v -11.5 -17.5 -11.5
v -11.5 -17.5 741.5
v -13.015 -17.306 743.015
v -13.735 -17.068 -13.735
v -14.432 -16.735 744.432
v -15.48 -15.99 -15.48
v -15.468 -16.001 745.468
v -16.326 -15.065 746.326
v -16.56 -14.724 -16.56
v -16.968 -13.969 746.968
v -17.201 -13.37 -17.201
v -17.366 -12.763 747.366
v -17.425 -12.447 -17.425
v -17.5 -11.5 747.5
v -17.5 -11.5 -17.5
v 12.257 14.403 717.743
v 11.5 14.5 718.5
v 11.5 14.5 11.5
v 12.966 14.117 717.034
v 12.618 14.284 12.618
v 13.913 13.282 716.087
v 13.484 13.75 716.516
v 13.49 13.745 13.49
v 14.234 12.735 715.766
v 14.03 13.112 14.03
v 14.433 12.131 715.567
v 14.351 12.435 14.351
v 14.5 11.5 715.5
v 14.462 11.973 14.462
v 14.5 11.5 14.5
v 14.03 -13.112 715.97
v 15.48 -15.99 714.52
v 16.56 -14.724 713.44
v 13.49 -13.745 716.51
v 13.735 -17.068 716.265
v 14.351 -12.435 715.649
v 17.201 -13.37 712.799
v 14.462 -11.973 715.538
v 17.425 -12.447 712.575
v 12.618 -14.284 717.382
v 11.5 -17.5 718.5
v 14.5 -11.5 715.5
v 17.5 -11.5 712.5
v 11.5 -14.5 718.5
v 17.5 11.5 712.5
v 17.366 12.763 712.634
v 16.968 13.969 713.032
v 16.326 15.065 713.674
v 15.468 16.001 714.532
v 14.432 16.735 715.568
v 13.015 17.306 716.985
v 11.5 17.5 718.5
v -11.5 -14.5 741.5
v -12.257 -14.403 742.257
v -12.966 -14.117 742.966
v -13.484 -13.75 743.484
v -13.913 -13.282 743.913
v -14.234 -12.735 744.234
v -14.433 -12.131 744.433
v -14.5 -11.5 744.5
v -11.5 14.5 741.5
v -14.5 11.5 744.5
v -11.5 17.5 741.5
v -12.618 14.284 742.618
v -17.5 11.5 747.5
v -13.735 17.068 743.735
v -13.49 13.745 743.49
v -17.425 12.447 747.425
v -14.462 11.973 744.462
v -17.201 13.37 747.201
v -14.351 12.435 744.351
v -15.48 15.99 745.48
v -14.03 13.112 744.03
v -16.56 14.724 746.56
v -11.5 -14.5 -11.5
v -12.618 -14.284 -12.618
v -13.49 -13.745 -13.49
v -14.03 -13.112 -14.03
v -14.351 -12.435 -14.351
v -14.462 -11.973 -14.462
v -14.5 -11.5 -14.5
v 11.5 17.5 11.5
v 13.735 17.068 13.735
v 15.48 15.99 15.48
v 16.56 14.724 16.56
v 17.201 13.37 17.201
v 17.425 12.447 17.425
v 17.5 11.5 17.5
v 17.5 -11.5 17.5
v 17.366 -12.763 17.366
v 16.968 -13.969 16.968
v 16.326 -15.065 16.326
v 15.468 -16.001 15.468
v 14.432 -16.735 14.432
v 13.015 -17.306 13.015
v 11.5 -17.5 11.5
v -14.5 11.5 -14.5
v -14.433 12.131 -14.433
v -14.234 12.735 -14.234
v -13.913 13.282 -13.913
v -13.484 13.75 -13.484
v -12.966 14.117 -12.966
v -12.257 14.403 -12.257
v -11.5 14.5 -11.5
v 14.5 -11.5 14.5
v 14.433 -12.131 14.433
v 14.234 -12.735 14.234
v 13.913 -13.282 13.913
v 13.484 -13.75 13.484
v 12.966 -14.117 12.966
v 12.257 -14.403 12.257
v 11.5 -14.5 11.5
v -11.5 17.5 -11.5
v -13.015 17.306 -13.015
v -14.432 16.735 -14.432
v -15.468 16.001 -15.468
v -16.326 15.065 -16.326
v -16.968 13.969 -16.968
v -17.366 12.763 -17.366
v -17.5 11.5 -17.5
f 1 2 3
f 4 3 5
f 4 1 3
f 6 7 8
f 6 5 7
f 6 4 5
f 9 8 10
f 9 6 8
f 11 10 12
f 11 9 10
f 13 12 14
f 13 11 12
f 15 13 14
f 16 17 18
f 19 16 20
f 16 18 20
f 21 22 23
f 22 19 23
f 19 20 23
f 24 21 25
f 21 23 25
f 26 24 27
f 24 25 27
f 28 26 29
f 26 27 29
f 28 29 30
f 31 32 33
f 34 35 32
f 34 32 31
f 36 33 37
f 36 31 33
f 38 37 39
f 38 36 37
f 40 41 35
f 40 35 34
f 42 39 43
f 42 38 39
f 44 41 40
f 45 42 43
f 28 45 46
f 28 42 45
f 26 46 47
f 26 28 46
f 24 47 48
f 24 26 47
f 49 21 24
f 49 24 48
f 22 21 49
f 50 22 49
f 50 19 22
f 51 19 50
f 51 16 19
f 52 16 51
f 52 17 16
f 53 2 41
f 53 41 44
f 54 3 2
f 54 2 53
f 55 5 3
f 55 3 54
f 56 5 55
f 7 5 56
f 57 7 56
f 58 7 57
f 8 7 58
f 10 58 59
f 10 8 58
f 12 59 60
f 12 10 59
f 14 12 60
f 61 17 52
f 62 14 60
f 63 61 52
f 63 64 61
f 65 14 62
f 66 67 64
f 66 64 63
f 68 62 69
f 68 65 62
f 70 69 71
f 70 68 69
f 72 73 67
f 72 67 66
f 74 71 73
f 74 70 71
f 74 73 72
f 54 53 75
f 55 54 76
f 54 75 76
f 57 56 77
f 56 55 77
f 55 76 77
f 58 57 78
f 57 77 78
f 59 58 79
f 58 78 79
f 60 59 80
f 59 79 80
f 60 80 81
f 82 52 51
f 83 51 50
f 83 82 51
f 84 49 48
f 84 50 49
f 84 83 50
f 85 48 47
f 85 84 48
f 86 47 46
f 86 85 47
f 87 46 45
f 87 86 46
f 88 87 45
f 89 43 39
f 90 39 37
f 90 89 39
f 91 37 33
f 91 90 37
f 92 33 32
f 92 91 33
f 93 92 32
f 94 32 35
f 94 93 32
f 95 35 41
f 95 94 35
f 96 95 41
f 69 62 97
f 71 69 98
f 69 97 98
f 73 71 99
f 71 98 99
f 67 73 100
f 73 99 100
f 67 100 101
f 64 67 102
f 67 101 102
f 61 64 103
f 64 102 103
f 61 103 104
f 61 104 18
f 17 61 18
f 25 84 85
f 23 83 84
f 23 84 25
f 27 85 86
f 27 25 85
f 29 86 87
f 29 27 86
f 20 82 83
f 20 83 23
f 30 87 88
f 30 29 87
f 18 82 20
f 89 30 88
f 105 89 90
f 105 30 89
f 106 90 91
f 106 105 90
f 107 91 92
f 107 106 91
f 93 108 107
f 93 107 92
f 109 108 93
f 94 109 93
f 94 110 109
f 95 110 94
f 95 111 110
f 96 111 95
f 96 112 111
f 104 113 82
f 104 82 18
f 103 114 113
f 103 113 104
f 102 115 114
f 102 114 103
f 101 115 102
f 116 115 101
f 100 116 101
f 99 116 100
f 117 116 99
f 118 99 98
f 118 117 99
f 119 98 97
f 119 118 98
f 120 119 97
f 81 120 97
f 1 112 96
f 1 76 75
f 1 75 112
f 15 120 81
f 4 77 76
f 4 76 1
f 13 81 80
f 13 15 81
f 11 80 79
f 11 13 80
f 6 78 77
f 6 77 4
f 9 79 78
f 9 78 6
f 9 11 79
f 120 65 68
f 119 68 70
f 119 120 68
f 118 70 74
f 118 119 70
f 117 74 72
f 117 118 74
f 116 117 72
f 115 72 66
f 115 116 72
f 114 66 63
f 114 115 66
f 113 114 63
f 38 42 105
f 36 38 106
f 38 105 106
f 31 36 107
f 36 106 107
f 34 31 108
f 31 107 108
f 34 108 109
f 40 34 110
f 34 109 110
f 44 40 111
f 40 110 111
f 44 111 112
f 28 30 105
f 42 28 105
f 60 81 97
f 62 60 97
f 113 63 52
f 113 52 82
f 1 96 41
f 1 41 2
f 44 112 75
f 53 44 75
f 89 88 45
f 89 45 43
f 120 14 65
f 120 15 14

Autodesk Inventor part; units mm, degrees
ref_plane "Start plane" through (0, 0, -17.5) normal (0, 0, 1) x (1, 0, 0)
ref_plane "End plane" through (0, 0, 747.5) normal (0, 0, 1) x (1, 0, 0)
sketch "Sketch" plane through (0, 0, 0) normal (0, 0, 1) x (1, 0, 0)
  line L0 (-17.5, -11.5) -> (-17.5, 11.5)
  line L1 (-11.5, 17.5) -> (11.5, 17.5)
  line L2 (17.5, 11.5) -> (17.5, -11.5)
  line L3 (11.5, -17.5) -> (-11.5, -17.5)
  arc A0 (-17.5, -11.5) -> (-11.5, -17.5) centre (-11.5, -11.5) ccw
  arc A1 (-11.5, 17.5) -> (-17.5, 11.5) centre (-11.5, 11.5) ccw
  arc A2 (17.5, 11.5) -> (11.5, 17.5) centre (11.5, 11.5) ccw
  arc A3 (11.5, -17.5) -> (17.5, -11.5) centre (11.5, -11.5) ccw
  arc A4 (-11.5, 14.5) -> (-14.5, 11.5) centre (-11.5, 11.5) ccw
  line L4 (-11.5, 14.5) -> (11.5, 14.5)
  arc A5 (14.5, 11.5) -> (11.5, 14.5) centre (11.5, 11.5) ccw
  line L5 (14.5, 11.5) -> (14.5, -11.5)
  arc A6 (11.5, -14.5) -> (14.5, -11.5) centre (11.5, -11.5) ccw
  line L6 (11.5, -14.5) -> (-11.5, -14.5)
  arc A7 (-14.5, -11.5) -> (-11.5, -14.5) centre (-11.5, -11.5) ccw
  line L7 (-14.5, -11.5) -> (-14.5, 11.5)
  line L8 (0, 25.4278) -> (0, -25.4278) construction
  line L9 (-25.4278, 0) -> (25.4278, 0) construction
  dimension "d7" = 6
  dimension "d10" = 35
  dimension "d11" = 35
  dimension "d12" = 3
  dimension "d15" = 17.5
  dimension "d16" = 17.5
extrude "Body" add sketch "Sketch" along normal up to surface (765 mm away) from surface at -17.5
sketch "Sketch3" plane through (0, 0, 0) normal (0, 0, 1) x (1, 0, 0)
  line L0 (0, 0) -> (10, 0)
ref_plane "Work Plane3" through (0, 0, 0) normal (0, -1, 0) x (1, 0, 0)
sketch "Sketch4" plane through (0, 0, 0) normal (0, -1, 0) x (1, 0, 0)
  line L0 (-2, -17.5) -> (12, -17.5)
  line L1 (-2, 747.5) -> (12, 747.5)
  dimension "d18" = 765
ref_plane "Work Plane4" through (0, -180, 747.5) normal (0, 0, 1) x (1, 0, 0)
split "Split1" plane through (0, -180, 747.5) removes the side toward (0, 0, 1)
ref_plane "Work Plane5" through (0, 0, -17.5) normal (0, 0, -1) x (-1, 0, 0)
split "Split2" plane through (0, 0, -17.5) removes the side toward (0, 0, -1)
ref_plane "Work Plane6" through (-17.5, 0, -17.5) normal (0.7071, 0, -0.7071) x (-0.7071, 0, -0.7071)
split "Split3" plane through (-17.5, 0, -17.5) removes the side toward (0.7071, 0, -0.7071)
ref_plane "Work Plane7" through (-17.5, 0, 747.5) normal (0.7071, 0, 0.7071) x (0.7071, 0, -0.7071)
split "Split4" plane through (-17.5, 0, 747.5) removes the side toward (0.7071, 0, 0.7071)
equation "\"d7\" = G_IR"
equation "\"d10\" = G_H"
equation "\"d11\" = G_W"
equation "\"d12\" = G_T"
equation "\"d15\" = 0.5 * d10"
equation "\"d16\" = 0.5 * d11"
equation "\"d3\" = G_L"
equation "\"G_W\" = 35"
equation "\"G_H\" = 35"
equation "\"G_T\" = 3"
equation "\"G_IR\" = 6"
equation "\"G_L\" = d18"
equation "\"G_OFFSET_START\" = 17.5"
equation "\"G_OFFSET_END\" = 17.5"
equation "\"d13\" = -G_OFFSET_START"
equation "\"d14\" = G_OFFSET_END + B_L"
equation "\"B_L\" = 730"
properties part number "AS 1163 - C350L0 35x35x3.0 SHS - 765" material "Steel, Mild"
